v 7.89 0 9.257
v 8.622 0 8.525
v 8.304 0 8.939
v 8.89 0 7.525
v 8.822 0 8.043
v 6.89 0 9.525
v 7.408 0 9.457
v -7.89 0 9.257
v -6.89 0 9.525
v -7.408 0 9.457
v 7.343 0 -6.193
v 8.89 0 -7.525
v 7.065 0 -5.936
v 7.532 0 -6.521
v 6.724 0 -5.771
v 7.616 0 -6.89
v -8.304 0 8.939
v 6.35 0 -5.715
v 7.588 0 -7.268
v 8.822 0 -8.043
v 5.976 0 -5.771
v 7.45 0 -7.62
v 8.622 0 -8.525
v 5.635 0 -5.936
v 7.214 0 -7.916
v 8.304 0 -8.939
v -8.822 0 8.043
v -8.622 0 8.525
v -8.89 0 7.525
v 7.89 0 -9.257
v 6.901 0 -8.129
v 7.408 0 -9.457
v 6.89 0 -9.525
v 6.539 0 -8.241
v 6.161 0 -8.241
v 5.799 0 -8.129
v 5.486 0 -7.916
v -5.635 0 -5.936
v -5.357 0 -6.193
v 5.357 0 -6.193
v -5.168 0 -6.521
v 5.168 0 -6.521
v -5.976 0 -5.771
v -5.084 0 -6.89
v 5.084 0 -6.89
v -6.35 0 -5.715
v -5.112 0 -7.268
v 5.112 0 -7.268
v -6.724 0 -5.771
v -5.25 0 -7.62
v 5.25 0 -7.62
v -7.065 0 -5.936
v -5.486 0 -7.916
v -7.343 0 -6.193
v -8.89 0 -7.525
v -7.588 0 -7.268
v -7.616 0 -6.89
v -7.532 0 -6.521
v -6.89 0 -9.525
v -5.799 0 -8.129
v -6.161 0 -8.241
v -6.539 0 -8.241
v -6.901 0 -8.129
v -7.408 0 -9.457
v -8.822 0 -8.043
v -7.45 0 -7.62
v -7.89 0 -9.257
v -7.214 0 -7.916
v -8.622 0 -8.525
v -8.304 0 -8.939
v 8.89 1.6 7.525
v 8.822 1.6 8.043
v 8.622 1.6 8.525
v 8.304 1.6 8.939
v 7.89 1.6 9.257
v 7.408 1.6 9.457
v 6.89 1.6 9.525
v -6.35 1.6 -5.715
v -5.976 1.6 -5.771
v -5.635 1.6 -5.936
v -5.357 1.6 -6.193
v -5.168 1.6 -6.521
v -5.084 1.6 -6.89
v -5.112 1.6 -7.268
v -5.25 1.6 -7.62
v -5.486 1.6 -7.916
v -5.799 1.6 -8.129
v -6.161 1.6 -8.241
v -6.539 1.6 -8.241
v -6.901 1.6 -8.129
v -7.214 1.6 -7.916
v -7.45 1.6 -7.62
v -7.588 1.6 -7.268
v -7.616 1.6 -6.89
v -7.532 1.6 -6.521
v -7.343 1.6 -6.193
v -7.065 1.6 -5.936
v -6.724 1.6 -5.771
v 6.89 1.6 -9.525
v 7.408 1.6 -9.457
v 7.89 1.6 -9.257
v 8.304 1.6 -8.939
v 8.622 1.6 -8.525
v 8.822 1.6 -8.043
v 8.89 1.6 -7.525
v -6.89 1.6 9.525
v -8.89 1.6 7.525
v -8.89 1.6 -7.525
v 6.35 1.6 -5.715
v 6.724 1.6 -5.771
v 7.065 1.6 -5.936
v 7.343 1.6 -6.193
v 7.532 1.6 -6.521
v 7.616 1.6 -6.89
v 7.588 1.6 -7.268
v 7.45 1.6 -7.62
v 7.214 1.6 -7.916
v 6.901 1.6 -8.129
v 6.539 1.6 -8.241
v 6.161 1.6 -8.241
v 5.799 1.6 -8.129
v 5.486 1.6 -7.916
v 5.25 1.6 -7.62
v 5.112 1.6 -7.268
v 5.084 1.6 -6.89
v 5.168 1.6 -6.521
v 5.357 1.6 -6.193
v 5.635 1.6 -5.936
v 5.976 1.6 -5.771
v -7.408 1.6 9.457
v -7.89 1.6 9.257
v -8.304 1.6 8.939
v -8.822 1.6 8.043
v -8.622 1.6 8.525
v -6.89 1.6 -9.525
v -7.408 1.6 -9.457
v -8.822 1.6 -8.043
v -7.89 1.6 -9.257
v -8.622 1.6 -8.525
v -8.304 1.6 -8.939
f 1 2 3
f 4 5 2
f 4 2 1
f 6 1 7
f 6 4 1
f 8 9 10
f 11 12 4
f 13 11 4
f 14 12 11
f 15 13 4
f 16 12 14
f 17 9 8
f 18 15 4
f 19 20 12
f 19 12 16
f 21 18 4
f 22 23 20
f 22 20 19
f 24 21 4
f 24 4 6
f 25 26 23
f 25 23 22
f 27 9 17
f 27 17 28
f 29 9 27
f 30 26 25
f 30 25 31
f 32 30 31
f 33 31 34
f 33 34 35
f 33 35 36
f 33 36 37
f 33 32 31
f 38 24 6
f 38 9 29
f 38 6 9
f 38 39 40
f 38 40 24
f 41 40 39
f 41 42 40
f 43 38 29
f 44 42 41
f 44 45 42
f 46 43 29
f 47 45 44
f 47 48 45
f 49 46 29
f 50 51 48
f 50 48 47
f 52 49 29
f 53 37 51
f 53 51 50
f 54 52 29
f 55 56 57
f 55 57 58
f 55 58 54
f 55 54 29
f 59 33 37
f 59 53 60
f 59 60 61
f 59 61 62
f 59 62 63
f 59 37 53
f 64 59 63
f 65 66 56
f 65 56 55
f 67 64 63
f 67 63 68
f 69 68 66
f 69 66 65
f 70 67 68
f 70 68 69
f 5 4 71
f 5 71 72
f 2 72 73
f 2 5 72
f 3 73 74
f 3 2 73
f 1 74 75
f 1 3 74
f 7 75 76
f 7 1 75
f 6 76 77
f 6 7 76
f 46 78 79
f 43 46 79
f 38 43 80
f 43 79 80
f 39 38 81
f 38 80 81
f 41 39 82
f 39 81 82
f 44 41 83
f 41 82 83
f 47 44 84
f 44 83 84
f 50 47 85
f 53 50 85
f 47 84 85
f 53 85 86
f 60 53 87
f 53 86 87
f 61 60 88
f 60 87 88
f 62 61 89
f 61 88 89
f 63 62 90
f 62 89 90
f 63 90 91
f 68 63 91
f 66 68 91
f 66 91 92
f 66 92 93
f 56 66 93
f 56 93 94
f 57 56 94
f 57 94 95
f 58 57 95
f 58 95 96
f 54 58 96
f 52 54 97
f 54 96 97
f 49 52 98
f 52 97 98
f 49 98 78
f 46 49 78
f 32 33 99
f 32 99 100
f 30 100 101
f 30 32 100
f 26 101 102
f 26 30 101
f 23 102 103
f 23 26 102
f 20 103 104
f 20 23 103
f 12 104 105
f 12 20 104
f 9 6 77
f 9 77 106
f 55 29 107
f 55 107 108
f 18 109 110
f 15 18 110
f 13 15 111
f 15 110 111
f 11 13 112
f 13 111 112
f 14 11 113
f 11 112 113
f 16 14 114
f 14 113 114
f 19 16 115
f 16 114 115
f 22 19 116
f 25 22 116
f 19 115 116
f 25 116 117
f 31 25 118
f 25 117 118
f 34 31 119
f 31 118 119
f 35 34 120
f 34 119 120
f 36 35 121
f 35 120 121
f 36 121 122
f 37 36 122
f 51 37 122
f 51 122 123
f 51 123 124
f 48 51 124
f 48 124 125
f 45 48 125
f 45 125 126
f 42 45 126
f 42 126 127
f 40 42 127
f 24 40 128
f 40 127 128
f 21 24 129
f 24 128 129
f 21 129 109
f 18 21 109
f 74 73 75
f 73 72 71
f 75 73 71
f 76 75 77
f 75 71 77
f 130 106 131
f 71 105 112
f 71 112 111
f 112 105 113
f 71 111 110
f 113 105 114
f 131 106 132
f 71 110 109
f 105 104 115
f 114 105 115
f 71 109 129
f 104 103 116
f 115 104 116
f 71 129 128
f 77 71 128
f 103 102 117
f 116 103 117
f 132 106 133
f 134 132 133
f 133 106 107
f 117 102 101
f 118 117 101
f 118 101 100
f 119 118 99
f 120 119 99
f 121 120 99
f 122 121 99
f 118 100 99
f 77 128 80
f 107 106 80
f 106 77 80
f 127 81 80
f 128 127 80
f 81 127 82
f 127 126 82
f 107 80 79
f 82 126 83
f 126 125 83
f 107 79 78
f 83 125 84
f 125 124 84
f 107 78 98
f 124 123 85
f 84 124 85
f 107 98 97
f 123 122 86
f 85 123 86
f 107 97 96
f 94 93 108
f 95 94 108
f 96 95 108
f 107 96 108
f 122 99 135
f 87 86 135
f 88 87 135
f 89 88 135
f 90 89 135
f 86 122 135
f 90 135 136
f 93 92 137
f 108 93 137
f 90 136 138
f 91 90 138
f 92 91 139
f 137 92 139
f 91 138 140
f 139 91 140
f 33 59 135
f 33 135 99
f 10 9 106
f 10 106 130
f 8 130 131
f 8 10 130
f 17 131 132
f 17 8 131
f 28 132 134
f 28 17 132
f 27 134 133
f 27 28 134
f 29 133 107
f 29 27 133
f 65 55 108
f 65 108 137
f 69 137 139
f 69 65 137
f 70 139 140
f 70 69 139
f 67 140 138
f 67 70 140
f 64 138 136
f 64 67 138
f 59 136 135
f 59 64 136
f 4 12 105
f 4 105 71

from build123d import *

# Parameters (mm, degrees)
BOSS_EXTRUDE1_DEPTH = 1.6
SKETCH2_R           = 1.27
CUT_EXTRUDE1_DEPTH  = 1.6


with BuildPart() as part:
    # Sketch1 → Boss-Extrude1 (new body)
    with BuildSketch(Plane(origin=(0, 0, 0), x_dir=(1, 0, 0), z_dir=(0, 1, 0))):
        with BuildLine():
            Line((-6.89, 9.525), (6.89, 9.525))
            ThreePointArc((6.89, 9.525), (8.304213562, 8.939213562), (8.89, 7.525))
            Line((8.89, 7.525), (8.89, -7.525))
            ThreePointArc((8.89, -7.525), (8.304213562, -8.939213562), (6.89, -9.525))
            Line((6.89, -9.525), (-6.89, -9.525))
            ThreePointArc((-6.89, -9.525), (-8.304213562, -8.939213562), (-8.89, -7.525))
            Line((-8.89, -7.525), (-8.89, 7.525))
            ThreePointArc((-8.89, 7.525), (-8.304213562, 8.939213562), (-6.89, 9.525))
        make_face()
    extrude(amount=BOSS_EXTRUDE1_DEPTH)

    # Sketch2 → Cut-Extrude1 (cut)
    with BuildSketch(Plane(origin=(0, 1.6, 0), x_dir=(1, 0, 0), z_dir=(0, 1, 0))):
        with Locations(Location((-6.35, 6.985, 0), (0, 0, 270))):
            Circle(SKETCH2_R)
        with Locations(Location((6.35, 6.985, 0), (0, 0, 270))):
            Circle(SKETCH2_R)
    extrude(amount=-CUT_EXTRUDE1_DEPTH, mode=Mode.SUBTRACT)


solid = part.part
